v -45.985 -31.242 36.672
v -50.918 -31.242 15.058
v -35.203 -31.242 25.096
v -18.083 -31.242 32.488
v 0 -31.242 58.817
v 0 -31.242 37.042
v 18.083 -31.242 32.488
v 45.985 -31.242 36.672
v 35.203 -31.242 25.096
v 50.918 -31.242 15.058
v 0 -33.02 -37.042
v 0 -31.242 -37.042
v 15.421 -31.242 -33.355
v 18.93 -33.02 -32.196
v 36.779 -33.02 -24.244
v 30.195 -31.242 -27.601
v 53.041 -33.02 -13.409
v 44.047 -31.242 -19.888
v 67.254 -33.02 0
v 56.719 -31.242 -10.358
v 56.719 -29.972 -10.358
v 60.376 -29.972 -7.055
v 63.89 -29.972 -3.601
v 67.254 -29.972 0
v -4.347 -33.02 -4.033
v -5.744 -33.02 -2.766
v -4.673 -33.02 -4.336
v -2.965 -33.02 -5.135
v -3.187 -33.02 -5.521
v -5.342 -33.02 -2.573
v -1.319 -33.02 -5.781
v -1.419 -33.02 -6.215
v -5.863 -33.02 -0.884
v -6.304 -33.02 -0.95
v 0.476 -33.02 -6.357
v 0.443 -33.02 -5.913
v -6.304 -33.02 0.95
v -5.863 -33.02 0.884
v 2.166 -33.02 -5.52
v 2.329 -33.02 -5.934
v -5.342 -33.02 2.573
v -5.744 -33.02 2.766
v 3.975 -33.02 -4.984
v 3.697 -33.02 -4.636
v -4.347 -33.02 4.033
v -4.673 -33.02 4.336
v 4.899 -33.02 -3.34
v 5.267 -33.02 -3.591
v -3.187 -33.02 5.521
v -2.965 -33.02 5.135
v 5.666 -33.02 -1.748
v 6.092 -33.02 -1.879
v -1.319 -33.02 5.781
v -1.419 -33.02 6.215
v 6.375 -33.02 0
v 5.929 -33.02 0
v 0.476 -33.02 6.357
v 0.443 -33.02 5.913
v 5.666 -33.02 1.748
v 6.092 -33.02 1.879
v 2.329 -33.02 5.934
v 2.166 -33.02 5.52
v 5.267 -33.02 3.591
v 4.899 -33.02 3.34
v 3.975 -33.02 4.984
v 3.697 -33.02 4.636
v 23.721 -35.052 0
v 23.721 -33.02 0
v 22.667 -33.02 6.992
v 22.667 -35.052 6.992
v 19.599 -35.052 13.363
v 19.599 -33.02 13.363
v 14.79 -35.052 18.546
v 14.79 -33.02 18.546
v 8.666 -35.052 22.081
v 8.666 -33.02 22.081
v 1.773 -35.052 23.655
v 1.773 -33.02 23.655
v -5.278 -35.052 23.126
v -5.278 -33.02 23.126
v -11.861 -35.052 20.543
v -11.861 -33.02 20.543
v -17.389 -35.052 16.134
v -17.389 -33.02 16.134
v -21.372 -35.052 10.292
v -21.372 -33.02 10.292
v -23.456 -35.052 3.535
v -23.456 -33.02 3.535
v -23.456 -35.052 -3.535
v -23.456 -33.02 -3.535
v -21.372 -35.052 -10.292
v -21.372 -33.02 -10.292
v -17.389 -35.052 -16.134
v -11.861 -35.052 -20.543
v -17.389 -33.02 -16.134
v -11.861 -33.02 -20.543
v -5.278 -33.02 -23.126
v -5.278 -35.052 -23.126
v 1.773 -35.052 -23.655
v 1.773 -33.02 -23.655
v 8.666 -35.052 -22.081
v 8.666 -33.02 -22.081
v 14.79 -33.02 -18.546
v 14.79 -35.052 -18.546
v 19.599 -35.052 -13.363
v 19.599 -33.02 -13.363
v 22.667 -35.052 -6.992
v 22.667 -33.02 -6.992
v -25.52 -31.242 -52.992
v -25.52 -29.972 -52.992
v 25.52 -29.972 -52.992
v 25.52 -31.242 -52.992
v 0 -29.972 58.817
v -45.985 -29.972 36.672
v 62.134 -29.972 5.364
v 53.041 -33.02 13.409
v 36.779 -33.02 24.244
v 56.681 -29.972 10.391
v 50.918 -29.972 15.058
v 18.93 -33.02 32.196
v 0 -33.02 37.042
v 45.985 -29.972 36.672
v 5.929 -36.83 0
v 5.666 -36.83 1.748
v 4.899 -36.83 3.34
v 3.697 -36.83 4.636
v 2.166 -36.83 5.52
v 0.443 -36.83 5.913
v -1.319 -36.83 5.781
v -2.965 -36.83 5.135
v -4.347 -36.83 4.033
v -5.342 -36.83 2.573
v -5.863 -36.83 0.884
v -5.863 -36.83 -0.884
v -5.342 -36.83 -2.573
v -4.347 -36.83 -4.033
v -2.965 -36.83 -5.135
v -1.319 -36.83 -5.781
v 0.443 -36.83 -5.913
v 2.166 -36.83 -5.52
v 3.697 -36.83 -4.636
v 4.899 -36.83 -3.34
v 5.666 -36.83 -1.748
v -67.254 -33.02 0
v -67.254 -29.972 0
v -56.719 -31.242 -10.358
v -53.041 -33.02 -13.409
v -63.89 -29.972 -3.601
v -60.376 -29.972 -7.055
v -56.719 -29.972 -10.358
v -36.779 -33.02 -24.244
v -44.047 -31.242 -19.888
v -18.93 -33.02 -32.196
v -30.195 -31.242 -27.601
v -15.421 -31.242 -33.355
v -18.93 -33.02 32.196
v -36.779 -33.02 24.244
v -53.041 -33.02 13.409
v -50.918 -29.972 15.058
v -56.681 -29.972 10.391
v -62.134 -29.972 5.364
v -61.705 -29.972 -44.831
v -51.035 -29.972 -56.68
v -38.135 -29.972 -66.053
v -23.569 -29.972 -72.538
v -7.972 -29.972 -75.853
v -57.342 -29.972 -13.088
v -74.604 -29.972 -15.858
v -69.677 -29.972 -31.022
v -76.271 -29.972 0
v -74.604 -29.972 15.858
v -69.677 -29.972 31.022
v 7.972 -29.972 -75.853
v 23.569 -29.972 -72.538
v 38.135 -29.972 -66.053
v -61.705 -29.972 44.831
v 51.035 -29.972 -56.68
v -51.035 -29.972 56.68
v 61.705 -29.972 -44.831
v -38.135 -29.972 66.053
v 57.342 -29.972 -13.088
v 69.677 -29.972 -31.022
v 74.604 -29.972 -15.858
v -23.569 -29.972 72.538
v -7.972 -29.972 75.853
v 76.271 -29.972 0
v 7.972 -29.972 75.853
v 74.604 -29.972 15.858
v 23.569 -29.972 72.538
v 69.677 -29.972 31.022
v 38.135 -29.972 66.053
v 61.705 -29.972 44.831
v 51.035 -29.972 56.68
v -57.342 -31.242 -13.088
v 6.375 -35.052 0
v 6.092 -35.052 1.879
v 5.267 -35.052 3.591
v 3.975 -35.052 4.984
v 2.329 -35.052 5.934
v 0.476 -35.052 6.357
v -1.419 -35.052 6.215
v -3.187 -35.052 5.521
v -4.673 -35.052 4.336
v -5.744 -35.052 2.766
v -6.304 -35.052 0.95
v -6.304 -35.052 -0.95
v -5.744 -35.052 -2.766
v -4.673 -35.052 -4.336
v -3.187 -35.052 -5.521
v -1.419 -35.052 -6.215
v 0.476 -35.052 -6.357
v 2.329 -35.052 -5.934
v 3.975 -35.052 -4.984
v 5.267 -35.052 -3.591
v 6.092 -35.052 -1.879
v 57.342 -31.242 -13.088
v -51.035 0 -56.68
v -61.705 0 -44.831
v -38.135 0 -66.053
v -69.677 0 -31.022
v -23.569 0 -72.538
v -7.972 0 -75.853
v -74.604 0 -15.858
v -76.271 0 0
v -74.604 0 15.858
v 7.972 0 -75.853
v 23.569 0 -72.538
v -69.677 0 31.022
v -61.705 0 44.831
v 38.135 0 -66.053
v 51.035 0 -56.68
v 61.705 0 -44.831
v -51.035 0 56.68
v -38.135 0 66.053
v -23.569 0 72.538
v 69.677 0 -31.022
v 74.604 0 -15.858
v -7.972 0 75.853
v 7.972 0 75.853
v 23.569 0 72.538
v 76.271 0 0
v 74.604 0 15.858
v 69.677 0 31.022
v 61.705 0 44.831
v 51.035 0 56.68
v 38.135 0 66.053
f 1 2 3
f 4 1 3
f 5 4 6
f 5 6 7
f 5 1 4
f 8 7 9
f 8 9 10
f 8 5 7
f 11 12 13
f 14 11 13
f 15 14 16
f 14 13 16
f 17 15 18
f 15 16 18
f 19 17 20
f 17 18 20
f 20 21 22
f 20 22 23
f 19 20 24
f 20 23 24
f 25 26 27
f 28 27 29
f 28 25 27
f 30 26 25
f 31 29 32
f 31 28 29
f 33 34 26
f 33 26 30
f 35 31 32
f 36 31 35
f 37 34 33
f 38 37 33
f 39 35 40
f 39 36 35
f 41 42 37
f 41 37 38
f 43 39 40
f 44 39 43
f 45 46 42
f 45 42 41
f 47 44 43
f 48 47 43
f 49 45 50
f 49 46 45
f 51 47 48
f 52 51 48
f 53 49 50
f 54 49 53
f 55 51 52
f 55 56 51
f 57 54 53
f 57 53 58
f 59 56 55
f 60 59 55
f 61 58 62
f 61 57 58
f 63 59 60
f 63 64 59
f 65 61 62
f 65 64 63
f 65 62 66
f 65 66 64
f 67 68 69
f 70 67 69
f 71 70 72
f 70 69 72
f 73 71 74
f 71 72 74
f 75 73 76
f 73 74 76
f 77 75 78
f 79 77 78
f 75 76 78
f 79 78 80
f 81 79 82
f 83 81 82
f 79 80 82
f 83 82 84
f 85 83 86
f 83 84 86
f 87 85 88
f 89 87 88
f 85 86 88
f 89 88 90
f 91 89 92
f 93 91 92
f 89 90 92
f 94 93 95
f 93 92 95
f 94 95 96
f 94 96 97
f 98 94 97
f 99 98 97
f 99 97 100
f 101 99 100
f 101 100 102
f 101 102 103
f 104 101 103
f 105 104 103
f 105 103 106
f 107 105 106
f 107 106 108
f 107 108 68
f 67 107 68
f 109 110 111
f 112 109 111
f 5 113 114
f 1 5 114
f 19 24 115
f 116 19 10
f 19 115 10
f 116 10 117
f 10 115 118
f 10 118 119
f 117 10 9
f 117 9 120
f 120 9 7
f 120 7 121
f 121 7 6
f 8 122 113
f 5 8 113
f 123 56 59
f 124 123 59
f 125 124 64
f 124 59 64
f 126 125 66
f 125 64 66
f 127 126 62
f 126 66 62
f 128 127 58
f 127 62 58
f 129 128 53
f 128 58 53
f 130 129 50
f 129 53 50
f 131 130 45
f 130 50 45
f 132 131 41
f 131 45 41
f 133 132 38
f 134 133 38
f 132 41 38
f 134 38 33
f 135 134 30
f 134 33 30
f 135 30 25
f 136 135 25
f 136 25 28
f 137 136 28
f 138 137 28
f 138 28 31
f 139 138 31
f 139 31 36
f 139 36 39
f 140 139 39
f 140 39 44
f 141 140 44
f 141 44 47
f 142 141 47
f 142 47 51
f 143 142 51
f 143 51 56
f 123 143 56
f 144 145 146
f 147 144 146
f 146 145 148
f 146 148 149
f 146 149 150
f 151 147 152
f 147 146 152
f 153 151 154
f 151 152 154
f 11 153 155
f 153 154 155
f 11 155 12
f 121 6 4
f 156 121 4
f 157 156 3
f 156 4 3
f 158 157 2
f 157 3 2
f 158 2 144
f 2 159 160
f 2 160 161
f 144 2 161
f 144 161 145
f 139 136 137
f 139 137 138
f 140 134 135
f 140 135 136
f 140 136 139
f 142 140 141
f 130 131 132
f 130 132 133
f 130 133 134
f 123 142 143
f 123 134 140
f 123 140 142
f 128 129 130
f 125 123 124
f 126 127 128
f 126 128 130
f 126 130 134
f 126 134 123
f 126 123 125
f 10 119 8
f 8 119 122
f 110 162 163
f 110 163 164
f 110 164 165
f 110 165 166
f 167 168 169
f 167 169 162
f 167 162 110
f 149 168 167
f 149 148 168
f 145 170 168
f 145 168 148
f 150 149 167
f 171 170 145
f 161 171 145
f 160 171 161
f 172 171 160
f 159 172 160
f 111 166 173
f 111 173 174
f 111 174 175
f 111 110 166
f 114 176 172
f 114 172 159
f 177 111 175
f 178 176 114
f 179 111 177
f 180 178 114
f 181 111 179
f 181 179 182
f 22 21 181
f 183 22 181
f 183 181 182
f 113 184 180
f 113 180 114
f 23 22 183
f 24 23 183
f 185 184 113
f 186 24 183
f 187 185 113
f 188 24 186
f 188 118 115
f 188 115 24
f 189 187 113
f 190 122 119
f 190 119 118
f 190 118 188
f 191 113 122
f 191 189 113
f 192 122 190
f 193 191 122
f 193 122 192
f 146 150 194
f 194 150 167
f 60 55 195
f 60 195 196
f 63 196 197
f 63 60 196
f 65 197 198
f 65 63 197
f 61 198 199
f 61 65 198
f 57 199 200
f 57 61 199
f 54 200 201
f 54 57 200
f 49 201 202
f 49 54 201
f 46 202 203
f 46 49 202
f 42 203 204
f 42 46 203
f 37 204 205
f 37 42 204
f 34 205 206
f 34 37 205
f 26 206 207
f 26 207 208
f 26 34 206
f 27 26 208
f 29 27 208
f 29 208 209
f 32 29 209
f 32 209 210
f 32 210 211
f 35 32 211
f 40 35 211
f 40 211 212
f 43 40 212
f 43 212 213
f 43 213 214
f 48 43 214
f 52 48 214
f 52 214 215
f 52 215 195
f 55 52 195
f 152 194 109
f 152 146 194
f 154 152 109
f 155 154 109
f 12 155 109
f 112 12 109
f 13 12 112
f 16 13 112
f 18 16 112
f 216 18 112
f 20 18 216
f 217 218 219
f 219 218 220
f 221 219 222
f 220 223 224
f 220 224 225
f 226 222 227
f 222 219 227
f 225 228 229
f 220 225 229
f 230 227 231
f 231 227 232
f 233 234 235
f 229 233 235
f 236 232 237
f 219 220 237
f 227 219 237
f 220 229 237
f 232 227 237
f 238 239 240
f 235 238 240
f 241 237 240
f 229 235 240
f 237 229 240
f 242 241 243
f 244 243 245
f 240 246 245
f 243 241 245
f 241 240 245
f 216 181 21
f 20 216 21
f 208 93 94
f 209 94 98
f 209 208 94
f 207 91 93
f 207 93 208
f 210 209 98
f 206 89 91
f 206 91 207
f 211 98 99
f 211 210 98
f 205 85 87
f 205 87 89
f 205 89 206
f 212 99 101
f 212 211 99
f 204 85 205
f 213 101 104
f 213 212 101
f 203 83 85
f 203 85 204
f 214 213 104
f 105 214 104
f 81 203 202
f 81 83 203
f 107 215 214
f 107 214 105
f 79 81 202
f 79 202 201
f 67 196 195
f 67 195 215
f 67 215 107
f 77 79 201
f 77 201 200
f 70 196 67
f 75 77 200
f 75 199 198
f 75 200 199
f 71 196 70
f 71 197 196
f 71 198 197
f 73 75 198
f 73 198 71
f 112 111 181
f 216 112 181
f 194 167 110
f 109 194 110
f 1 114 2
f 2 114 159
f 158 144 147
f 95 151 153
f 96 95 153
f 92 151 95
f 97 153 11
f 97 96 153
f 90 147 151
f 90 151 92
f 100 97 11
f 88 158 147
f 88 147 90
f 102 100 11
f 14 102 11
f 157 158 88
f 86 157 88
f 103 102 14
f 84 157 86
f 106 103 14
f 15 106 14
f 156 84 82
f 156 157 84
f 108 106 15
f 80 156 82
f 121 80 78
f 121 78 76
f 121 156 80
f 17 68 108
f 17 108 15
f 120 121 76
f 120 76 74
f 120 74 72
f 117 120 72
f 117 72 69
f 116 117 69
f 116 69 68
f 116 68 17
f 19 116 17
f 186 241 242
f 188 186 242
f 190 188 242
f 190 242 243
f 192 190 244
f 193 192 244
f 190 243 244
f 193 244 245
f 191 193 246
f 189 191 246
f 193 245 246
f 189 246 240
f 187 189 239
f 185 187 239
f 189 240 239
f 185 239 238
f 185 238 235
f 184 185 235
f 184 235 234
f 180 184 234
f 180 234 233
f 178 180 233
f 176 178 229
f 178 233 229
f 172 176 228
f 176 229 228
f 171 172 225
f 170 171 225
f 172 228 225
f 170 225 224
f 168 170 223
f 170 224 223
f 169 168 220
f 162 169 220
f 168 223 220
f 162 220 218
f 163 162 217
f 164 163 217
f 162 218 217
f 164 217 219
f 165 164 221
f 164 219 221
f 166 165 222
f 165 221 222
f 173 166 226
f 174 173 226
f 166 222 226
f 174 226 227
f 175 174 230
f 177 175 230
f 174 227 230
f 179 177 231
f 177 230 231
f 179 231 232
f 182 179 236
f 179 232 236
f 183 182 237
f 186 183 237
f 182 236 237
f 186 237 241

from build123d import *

# Parameters (mm, degrees)
F0_R     = 76.270958
F1_DEPTH = 29.972
F3_DEPTH = 33.02
F5_DEPTH = 31.242
F6_R     = 23.721121
F6_R_2   = 6.37486
F7_DEPTH = 35.052
F8_R     = 5.929378
F9_DEPTH = 36.83


with BuildPart() as f1:
    # F0 (on Front) → F1 (new body)
    with BuildSketch(Plane.XZ):
        Circle(F0_R)
    extrude(amount=F1_DEPTH)

    # F2 (on Front) → F3 (join)
    with BuildSketch(Plane.XZ):
        with BuildLine():
            ThreePointArc((67.254432, 0), (36.779267, 24.243834), (0, 37.041672))
            ThreePointArc((0, 37.041672), (-36.779267, 24.243834), (-67.254432, 0))
            ThreePointArc((-67.254432, 0), (-36.779267, -24.243834), (0, -37.041672))
            ThreePointArc((0, -37.041672), (36.779267, -24.243834), (67.254432, 0))
        make_face()
    extrude(amount=F3_DEPTH)

    # F4 (on Front) → F5 (join)
    with BuildSketch(Plane.XZ):
        Polygon((-25.51971, -52.992225), (25.51971, -52.992225), (57.342269, -13.087999), (45.984929, 36.671757), (0, 58.816932), (-45.984929, 36.671757), (-57.342269, -13.087999), align=None)
    extrude(amount=F5_DEPTH)

    # F6 (on Front) → F7 (join)
    with BuildSketch(Plane.XZ):
        Circle(F6_R)
        Circle(F6_R_2, mode=Mode.SUBTRACT)
    extrude(amount=F7_DEPTH)

    # F8 (on Front) → F9 (join)
    with BuildSketch(Plane.XZ):
        Circle(F8_R)
    extrude(amount=F9_DEPTH)


solid = f1.part
